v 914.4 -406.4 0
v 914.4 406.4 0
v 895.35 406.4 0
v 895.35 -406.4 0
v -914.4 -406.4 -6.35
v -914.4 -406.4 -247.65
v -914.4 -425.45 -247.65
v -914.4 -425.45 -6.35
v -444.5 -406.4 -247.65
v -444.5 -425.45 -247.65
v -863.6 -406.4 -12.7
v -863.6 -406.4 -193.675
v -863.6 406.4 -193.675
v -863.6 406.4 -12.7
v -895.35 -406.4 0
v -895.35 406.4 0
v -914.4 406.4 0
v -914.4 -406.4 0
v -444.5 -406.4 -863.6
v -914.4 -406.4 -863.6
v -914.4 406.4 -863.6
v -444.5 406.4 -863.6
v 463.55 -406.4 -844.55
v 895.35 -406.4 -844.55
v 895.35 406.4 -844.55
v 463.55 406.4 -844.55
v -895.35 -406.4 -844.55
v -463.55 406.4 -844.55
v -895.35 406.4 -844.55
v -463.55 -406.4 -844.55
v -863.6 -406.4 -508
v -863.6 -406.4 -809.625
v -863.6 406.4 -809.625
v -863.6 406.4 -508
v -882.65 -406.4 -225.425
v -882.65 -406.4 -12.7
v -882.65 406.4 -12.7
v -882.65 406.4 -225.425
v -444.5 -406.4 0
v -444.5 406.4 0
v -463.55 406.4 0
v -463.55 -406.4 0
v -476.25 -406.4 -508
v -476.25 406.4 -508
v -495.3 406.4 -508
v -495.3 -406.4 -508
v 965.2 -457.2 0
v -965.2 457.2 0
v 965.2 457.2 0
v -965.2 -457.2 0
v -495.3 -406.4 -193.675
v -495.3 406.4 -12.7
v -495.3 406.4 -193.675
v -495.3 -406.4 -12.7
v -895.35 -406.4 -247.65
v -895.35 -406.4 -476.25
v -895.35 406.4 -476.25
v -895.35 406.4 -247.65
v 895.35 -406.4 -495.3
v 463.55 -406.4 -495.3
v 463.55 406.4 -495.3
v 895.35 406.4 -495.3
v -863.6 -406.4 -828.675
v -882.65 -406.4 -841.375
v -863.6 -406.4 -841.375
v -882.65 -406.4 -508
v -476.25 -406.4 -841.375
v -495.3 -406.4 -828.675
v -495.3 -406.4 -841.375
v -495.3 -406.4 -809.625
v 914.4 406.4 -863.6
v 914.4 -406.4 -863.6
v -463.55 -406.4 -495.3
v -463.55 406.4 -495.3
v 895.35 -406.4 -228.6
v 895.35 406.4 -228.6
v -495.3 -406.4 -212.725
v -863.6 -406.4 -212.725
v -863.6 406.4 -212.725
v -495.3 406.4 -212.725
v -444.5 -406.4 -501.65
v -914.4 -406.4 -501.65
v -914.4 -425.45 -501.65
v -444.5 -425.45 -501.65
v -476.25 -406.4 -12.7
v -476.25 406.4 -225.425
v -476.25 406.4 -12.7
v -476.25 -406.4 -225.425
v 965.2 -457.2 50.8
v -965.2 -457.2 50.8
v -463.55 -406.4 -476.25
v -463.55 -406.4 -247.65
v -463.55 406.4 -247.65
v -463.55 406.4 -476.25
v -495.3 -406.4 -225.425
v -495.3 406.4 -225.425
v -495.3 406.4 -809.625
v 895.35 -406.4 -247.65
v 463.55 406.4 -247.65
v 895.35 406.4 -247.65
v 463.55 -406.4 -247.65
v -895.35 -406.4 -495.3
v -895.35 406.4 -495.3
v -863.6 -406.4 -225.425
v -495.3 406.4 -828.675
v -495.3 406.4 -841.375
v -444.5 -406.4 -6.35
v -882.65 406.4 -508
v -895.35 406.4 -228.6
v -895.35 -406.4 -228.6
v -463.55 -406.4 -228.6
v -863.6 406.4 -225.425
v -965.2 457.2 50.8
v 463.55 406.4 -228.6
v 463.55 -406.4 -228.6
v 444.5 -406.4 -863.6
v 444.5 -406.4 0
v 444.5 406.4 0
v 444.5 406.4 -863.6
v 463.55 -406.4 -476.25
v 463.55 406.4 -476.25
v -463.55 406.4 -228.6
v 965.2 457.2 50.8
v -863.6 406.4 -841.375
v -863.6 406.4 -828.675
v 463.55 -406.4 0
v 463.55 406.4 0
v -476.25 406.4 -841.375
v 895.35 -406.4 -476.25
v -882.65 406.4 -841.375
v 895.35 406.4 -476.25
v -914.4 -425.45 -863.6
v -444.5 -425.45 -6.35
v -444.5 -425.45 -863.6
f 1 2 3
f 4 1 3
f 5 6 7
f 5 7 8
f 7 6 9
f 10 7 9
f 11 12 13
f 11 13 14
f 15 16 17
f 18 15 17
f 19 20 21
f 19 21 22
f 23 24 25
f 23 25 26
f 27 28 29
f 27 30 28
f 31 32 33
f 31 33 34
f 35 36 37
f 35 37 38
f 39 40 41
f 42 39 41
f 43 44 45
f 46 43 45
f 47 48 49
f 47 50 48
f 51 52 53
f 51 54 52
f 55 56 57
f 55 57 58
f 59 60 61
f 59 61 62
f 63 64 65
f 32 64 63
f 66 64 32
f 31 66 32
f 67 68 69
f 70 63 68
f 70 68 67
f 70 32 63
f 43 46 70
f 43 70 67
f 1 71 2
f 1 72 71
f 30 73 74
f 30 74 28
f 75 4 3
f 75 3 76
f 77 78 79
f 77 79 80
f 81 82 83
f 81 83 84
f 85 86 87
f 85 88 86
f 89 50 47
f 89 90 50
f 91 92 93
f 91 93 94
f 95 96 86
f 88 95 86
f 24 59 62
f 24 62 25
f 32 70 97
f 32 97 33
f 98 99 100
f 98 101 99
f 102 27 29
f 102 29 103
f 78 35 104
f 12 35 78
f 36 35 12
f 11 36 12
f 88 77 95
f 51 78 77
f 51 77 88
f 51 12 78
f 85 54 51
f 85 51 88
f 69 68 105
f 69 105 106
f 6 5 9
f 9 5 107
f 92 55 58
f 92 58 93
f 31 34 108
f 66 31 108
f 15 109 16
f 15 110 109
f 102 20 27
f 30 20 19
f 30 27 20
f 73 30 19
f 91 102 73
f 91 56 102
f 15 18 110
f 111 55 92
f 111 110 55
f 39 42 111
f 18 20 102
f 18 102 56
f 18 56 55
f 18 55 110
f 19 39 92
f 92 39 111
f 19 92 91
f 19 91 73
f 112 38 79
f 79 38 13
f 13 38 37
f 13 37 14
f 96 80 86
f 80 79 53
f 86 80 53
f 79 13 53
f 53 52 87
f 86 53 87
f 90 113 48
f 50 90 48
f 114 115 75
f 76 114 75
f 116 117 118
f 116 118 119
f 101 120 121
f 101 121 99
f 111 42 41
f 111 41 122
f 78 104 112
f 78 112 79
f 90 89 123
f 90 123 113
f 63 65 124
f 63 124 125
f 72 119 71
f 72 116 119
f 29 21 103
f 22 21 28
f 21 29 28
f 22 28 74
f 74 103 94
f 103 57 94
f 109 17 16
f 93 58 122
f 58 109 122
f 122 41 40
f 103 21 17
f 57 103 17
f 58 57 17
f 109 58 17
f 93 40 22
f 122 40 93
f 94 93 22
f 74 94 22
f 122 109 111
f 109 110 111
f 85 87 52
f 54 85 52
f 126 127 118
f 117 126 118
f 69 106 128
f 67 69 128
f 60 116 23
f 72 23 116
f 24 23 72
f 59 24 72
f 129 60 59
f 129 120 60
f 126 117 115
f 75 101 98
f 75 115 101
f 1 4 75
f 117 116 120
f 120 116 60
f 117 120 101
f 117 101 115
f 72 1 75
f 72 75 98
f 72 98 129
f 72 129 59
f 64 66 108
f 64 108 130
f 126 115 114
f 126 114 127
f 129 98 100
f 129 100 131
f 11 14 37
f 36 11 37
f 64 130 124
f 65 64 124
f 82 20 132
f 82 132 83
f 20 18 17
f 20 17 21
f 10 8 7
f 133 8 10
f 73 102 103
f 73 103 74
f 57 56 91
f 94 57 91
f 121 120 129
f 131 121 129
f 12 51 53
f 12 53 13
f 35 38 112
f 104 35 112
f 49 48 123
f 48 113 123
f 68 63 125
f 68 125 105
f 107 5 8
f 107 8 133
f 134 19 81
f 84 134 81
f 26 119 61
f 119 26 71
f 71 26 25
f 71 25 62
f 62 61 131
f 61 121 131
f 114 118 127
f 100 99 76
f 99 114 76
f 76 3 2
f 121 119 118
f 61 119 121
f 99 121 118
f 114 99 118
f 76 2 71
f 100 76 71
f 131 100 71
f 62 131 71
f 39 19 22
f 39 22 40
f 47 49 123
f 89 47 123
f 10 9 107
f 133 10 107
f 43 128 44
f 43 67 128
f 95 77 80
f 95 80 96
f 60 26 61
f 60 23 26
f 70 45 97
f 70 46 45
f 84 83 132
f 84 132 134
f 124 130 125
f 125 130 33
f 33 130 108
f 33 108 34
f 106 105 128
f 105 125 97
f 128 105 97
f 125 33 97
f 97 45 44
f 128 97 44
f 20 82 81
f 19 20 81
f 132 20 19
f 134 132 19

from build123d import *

# Parameters (mm, degrees)
F0_W     = 431.8
F0_H     = 19.05
F1_DEPTH = 406.4
F2_DEPTH = 457.2
F3_DEPTH = 406.4
F4_DEPTH = 406.4
F6_W     = 469.9
F6_H     = 241.3
F7_DEPTH = 19.05
F6_H_2   = 361.95


with BuildPart() as f1:
    # F0 (on Front) → F1 (new body, symmetric)
    with BuildSketch(Plane.XZ):
        Polygon((-895.35, 0), (-914.4, 0), (-914.4, -844.55), (-895.35, -844.55), (-895.35, -495.3), (-895.35, -476.25), (-895.35, -247.65), (-895.35, -228.6), align=None)
        with Locations((-679.45, -238.125)):
            Rectangle(F0_W, F0_H)
        with Locations((-679.45, -485.775)):
            Rectangle(F0_W, F0_H)
        Polygon((-895.35, -844.55), (-914.4, -844.55), (-914.4, -863.6), (-444.5, -863.6), (-444.5, -844.55), (-463.55, -844.55), align=None)
        Polygon((-444.5, 0), (-463.55, 0), (-463.55, -228.6), (-463.55, -247.65), (-463.55, -476.25), (-463.55, -495.3), (-463.55, -844.55), (-444.5, -844.55), align=None)
    extrude(amount=F1_DEPTH, both=True)


with BuildPart() as f1b:
    # F0 (on Front) → F1, piece 2 (new body, symmetric)
    with BuildSketch(Plane.XZ):
        Polygon((914.4, -844.55), (914.4, 0), (895.35, 0), (895.35, -228.6), (895.35, -247.65), (895.35, -476.25), (895.35, -495.3), (895.35, -844.55), align=None)
        with Locations((679.45, -238.125)):
            Rectangle(F0_W, F0_H)
        with Locations((679.45, -485.775)):
            Rectangle(F0_W, F0_H)
        Polygon((463.55, 0), (444.5, 0), (444.5, -844.55), (463.55, -844.55), (463.55, -495.3), (463.55, -476.25), (463.55, -247.65), (463.55, -228.6), align=None)
        Polygon((463.55, -844.55), (444.5, -844.55), (444.5, -863.6), (914.4, -863.6), (914.4, -844.55), (895.35, -844.55), align=None)
    extrude(amount=F1_DEPTH, both=True)


with BuildPart() as f2:
    # F0 (on Front) → F2 (new body, symmetric)
    with BuildSketch(Plane.XZ):
        Polygon((-965.2, 0), (-914.4, 0), (-895.35, 0), (-463.55, 0), (-444.5, 0), (444.5, 0), (463.55, 0), (895.35, 0), (914.4, 0), (965.2, 0), (965.2, 50.8), (-965.2, 50.8), align=None)
    extrude(amount=F2_DEPTH, both=True)


with BuildPart() as f3:
    # F0 (on Front) → F3 (new body, symmetric)
    with BuildSketch(Plane.XZ):
        Polygon((-495.3, -508), (-495.3, -809.625), (-495.3, -828.675), (-495.3, -841.375), (-476.25, -841.375), (-476.25, -508), align=None)
        Polygon((-679.45, -809.625), (-863.6, -809.625), (-863.6, -828.675), (-679.45, -828.675), (-495.3, -828.675), (-495.3, -809.625), align=None)
        Polygon((-863.6, -508), (-882.65, -508), (-882.65, -841.375), (-863.6, -841.375), (-863.6, -828.675), (-863.6, -809.625), align=None)
    extrude(amount=F3_DEPTH, both=True)


with BuildPart() as f4:
    # F0 (on Front) → F4 (new body, symmetric)
    with BuildSketch(Plane.XZ):
        Polygon((-495.3, -12.7), (-495.3, -193.675), (-495.3, -212.725), (-495.3, -225.425), (-476.25, -225.425), (-476.25, -12.7), align=None)
        Polygon((-679.45, -193.675), (-863.6, -193.675), (-863.6, -212.725), (-679.45, -212.725), (-495.3, -212.725), (-495.3, -193.675), align=None)
        Polygon((-863.6, -12.7), (-882.65, -12.7), (-882.65, -225.425), (-863.6, -225.425), (-863.6, -212.725), (-863.6, -193.675), align=None)
    extrude(amount=F4_DEPTH, both=True)


with BuildPart() as f7:
    # F6 (on 3pt) → F7 (new body)
    with BuildSketch(Plane.XZ.offset(406.4)):
        with Locations((-679.45, -127)):
            Rectangle(F6_W, F6_H)
    extrude(amount=F7_DEPTH)


with BuildPart() as f7b:
    # F6 (on 3pt) → F7, piece 2 (new body)
    with BuildSketch(Plane.XZ.offset(406.4)):
        with Locations((-679.45, -682.625)):
            Rectangle(F6_W, F6_H_2)
    extrude(amount=F7_DEPTH)


solid = Compound([f1.part, f1b.part, f2.part, f3.part, f4.part, f7.part, f7b.part])
